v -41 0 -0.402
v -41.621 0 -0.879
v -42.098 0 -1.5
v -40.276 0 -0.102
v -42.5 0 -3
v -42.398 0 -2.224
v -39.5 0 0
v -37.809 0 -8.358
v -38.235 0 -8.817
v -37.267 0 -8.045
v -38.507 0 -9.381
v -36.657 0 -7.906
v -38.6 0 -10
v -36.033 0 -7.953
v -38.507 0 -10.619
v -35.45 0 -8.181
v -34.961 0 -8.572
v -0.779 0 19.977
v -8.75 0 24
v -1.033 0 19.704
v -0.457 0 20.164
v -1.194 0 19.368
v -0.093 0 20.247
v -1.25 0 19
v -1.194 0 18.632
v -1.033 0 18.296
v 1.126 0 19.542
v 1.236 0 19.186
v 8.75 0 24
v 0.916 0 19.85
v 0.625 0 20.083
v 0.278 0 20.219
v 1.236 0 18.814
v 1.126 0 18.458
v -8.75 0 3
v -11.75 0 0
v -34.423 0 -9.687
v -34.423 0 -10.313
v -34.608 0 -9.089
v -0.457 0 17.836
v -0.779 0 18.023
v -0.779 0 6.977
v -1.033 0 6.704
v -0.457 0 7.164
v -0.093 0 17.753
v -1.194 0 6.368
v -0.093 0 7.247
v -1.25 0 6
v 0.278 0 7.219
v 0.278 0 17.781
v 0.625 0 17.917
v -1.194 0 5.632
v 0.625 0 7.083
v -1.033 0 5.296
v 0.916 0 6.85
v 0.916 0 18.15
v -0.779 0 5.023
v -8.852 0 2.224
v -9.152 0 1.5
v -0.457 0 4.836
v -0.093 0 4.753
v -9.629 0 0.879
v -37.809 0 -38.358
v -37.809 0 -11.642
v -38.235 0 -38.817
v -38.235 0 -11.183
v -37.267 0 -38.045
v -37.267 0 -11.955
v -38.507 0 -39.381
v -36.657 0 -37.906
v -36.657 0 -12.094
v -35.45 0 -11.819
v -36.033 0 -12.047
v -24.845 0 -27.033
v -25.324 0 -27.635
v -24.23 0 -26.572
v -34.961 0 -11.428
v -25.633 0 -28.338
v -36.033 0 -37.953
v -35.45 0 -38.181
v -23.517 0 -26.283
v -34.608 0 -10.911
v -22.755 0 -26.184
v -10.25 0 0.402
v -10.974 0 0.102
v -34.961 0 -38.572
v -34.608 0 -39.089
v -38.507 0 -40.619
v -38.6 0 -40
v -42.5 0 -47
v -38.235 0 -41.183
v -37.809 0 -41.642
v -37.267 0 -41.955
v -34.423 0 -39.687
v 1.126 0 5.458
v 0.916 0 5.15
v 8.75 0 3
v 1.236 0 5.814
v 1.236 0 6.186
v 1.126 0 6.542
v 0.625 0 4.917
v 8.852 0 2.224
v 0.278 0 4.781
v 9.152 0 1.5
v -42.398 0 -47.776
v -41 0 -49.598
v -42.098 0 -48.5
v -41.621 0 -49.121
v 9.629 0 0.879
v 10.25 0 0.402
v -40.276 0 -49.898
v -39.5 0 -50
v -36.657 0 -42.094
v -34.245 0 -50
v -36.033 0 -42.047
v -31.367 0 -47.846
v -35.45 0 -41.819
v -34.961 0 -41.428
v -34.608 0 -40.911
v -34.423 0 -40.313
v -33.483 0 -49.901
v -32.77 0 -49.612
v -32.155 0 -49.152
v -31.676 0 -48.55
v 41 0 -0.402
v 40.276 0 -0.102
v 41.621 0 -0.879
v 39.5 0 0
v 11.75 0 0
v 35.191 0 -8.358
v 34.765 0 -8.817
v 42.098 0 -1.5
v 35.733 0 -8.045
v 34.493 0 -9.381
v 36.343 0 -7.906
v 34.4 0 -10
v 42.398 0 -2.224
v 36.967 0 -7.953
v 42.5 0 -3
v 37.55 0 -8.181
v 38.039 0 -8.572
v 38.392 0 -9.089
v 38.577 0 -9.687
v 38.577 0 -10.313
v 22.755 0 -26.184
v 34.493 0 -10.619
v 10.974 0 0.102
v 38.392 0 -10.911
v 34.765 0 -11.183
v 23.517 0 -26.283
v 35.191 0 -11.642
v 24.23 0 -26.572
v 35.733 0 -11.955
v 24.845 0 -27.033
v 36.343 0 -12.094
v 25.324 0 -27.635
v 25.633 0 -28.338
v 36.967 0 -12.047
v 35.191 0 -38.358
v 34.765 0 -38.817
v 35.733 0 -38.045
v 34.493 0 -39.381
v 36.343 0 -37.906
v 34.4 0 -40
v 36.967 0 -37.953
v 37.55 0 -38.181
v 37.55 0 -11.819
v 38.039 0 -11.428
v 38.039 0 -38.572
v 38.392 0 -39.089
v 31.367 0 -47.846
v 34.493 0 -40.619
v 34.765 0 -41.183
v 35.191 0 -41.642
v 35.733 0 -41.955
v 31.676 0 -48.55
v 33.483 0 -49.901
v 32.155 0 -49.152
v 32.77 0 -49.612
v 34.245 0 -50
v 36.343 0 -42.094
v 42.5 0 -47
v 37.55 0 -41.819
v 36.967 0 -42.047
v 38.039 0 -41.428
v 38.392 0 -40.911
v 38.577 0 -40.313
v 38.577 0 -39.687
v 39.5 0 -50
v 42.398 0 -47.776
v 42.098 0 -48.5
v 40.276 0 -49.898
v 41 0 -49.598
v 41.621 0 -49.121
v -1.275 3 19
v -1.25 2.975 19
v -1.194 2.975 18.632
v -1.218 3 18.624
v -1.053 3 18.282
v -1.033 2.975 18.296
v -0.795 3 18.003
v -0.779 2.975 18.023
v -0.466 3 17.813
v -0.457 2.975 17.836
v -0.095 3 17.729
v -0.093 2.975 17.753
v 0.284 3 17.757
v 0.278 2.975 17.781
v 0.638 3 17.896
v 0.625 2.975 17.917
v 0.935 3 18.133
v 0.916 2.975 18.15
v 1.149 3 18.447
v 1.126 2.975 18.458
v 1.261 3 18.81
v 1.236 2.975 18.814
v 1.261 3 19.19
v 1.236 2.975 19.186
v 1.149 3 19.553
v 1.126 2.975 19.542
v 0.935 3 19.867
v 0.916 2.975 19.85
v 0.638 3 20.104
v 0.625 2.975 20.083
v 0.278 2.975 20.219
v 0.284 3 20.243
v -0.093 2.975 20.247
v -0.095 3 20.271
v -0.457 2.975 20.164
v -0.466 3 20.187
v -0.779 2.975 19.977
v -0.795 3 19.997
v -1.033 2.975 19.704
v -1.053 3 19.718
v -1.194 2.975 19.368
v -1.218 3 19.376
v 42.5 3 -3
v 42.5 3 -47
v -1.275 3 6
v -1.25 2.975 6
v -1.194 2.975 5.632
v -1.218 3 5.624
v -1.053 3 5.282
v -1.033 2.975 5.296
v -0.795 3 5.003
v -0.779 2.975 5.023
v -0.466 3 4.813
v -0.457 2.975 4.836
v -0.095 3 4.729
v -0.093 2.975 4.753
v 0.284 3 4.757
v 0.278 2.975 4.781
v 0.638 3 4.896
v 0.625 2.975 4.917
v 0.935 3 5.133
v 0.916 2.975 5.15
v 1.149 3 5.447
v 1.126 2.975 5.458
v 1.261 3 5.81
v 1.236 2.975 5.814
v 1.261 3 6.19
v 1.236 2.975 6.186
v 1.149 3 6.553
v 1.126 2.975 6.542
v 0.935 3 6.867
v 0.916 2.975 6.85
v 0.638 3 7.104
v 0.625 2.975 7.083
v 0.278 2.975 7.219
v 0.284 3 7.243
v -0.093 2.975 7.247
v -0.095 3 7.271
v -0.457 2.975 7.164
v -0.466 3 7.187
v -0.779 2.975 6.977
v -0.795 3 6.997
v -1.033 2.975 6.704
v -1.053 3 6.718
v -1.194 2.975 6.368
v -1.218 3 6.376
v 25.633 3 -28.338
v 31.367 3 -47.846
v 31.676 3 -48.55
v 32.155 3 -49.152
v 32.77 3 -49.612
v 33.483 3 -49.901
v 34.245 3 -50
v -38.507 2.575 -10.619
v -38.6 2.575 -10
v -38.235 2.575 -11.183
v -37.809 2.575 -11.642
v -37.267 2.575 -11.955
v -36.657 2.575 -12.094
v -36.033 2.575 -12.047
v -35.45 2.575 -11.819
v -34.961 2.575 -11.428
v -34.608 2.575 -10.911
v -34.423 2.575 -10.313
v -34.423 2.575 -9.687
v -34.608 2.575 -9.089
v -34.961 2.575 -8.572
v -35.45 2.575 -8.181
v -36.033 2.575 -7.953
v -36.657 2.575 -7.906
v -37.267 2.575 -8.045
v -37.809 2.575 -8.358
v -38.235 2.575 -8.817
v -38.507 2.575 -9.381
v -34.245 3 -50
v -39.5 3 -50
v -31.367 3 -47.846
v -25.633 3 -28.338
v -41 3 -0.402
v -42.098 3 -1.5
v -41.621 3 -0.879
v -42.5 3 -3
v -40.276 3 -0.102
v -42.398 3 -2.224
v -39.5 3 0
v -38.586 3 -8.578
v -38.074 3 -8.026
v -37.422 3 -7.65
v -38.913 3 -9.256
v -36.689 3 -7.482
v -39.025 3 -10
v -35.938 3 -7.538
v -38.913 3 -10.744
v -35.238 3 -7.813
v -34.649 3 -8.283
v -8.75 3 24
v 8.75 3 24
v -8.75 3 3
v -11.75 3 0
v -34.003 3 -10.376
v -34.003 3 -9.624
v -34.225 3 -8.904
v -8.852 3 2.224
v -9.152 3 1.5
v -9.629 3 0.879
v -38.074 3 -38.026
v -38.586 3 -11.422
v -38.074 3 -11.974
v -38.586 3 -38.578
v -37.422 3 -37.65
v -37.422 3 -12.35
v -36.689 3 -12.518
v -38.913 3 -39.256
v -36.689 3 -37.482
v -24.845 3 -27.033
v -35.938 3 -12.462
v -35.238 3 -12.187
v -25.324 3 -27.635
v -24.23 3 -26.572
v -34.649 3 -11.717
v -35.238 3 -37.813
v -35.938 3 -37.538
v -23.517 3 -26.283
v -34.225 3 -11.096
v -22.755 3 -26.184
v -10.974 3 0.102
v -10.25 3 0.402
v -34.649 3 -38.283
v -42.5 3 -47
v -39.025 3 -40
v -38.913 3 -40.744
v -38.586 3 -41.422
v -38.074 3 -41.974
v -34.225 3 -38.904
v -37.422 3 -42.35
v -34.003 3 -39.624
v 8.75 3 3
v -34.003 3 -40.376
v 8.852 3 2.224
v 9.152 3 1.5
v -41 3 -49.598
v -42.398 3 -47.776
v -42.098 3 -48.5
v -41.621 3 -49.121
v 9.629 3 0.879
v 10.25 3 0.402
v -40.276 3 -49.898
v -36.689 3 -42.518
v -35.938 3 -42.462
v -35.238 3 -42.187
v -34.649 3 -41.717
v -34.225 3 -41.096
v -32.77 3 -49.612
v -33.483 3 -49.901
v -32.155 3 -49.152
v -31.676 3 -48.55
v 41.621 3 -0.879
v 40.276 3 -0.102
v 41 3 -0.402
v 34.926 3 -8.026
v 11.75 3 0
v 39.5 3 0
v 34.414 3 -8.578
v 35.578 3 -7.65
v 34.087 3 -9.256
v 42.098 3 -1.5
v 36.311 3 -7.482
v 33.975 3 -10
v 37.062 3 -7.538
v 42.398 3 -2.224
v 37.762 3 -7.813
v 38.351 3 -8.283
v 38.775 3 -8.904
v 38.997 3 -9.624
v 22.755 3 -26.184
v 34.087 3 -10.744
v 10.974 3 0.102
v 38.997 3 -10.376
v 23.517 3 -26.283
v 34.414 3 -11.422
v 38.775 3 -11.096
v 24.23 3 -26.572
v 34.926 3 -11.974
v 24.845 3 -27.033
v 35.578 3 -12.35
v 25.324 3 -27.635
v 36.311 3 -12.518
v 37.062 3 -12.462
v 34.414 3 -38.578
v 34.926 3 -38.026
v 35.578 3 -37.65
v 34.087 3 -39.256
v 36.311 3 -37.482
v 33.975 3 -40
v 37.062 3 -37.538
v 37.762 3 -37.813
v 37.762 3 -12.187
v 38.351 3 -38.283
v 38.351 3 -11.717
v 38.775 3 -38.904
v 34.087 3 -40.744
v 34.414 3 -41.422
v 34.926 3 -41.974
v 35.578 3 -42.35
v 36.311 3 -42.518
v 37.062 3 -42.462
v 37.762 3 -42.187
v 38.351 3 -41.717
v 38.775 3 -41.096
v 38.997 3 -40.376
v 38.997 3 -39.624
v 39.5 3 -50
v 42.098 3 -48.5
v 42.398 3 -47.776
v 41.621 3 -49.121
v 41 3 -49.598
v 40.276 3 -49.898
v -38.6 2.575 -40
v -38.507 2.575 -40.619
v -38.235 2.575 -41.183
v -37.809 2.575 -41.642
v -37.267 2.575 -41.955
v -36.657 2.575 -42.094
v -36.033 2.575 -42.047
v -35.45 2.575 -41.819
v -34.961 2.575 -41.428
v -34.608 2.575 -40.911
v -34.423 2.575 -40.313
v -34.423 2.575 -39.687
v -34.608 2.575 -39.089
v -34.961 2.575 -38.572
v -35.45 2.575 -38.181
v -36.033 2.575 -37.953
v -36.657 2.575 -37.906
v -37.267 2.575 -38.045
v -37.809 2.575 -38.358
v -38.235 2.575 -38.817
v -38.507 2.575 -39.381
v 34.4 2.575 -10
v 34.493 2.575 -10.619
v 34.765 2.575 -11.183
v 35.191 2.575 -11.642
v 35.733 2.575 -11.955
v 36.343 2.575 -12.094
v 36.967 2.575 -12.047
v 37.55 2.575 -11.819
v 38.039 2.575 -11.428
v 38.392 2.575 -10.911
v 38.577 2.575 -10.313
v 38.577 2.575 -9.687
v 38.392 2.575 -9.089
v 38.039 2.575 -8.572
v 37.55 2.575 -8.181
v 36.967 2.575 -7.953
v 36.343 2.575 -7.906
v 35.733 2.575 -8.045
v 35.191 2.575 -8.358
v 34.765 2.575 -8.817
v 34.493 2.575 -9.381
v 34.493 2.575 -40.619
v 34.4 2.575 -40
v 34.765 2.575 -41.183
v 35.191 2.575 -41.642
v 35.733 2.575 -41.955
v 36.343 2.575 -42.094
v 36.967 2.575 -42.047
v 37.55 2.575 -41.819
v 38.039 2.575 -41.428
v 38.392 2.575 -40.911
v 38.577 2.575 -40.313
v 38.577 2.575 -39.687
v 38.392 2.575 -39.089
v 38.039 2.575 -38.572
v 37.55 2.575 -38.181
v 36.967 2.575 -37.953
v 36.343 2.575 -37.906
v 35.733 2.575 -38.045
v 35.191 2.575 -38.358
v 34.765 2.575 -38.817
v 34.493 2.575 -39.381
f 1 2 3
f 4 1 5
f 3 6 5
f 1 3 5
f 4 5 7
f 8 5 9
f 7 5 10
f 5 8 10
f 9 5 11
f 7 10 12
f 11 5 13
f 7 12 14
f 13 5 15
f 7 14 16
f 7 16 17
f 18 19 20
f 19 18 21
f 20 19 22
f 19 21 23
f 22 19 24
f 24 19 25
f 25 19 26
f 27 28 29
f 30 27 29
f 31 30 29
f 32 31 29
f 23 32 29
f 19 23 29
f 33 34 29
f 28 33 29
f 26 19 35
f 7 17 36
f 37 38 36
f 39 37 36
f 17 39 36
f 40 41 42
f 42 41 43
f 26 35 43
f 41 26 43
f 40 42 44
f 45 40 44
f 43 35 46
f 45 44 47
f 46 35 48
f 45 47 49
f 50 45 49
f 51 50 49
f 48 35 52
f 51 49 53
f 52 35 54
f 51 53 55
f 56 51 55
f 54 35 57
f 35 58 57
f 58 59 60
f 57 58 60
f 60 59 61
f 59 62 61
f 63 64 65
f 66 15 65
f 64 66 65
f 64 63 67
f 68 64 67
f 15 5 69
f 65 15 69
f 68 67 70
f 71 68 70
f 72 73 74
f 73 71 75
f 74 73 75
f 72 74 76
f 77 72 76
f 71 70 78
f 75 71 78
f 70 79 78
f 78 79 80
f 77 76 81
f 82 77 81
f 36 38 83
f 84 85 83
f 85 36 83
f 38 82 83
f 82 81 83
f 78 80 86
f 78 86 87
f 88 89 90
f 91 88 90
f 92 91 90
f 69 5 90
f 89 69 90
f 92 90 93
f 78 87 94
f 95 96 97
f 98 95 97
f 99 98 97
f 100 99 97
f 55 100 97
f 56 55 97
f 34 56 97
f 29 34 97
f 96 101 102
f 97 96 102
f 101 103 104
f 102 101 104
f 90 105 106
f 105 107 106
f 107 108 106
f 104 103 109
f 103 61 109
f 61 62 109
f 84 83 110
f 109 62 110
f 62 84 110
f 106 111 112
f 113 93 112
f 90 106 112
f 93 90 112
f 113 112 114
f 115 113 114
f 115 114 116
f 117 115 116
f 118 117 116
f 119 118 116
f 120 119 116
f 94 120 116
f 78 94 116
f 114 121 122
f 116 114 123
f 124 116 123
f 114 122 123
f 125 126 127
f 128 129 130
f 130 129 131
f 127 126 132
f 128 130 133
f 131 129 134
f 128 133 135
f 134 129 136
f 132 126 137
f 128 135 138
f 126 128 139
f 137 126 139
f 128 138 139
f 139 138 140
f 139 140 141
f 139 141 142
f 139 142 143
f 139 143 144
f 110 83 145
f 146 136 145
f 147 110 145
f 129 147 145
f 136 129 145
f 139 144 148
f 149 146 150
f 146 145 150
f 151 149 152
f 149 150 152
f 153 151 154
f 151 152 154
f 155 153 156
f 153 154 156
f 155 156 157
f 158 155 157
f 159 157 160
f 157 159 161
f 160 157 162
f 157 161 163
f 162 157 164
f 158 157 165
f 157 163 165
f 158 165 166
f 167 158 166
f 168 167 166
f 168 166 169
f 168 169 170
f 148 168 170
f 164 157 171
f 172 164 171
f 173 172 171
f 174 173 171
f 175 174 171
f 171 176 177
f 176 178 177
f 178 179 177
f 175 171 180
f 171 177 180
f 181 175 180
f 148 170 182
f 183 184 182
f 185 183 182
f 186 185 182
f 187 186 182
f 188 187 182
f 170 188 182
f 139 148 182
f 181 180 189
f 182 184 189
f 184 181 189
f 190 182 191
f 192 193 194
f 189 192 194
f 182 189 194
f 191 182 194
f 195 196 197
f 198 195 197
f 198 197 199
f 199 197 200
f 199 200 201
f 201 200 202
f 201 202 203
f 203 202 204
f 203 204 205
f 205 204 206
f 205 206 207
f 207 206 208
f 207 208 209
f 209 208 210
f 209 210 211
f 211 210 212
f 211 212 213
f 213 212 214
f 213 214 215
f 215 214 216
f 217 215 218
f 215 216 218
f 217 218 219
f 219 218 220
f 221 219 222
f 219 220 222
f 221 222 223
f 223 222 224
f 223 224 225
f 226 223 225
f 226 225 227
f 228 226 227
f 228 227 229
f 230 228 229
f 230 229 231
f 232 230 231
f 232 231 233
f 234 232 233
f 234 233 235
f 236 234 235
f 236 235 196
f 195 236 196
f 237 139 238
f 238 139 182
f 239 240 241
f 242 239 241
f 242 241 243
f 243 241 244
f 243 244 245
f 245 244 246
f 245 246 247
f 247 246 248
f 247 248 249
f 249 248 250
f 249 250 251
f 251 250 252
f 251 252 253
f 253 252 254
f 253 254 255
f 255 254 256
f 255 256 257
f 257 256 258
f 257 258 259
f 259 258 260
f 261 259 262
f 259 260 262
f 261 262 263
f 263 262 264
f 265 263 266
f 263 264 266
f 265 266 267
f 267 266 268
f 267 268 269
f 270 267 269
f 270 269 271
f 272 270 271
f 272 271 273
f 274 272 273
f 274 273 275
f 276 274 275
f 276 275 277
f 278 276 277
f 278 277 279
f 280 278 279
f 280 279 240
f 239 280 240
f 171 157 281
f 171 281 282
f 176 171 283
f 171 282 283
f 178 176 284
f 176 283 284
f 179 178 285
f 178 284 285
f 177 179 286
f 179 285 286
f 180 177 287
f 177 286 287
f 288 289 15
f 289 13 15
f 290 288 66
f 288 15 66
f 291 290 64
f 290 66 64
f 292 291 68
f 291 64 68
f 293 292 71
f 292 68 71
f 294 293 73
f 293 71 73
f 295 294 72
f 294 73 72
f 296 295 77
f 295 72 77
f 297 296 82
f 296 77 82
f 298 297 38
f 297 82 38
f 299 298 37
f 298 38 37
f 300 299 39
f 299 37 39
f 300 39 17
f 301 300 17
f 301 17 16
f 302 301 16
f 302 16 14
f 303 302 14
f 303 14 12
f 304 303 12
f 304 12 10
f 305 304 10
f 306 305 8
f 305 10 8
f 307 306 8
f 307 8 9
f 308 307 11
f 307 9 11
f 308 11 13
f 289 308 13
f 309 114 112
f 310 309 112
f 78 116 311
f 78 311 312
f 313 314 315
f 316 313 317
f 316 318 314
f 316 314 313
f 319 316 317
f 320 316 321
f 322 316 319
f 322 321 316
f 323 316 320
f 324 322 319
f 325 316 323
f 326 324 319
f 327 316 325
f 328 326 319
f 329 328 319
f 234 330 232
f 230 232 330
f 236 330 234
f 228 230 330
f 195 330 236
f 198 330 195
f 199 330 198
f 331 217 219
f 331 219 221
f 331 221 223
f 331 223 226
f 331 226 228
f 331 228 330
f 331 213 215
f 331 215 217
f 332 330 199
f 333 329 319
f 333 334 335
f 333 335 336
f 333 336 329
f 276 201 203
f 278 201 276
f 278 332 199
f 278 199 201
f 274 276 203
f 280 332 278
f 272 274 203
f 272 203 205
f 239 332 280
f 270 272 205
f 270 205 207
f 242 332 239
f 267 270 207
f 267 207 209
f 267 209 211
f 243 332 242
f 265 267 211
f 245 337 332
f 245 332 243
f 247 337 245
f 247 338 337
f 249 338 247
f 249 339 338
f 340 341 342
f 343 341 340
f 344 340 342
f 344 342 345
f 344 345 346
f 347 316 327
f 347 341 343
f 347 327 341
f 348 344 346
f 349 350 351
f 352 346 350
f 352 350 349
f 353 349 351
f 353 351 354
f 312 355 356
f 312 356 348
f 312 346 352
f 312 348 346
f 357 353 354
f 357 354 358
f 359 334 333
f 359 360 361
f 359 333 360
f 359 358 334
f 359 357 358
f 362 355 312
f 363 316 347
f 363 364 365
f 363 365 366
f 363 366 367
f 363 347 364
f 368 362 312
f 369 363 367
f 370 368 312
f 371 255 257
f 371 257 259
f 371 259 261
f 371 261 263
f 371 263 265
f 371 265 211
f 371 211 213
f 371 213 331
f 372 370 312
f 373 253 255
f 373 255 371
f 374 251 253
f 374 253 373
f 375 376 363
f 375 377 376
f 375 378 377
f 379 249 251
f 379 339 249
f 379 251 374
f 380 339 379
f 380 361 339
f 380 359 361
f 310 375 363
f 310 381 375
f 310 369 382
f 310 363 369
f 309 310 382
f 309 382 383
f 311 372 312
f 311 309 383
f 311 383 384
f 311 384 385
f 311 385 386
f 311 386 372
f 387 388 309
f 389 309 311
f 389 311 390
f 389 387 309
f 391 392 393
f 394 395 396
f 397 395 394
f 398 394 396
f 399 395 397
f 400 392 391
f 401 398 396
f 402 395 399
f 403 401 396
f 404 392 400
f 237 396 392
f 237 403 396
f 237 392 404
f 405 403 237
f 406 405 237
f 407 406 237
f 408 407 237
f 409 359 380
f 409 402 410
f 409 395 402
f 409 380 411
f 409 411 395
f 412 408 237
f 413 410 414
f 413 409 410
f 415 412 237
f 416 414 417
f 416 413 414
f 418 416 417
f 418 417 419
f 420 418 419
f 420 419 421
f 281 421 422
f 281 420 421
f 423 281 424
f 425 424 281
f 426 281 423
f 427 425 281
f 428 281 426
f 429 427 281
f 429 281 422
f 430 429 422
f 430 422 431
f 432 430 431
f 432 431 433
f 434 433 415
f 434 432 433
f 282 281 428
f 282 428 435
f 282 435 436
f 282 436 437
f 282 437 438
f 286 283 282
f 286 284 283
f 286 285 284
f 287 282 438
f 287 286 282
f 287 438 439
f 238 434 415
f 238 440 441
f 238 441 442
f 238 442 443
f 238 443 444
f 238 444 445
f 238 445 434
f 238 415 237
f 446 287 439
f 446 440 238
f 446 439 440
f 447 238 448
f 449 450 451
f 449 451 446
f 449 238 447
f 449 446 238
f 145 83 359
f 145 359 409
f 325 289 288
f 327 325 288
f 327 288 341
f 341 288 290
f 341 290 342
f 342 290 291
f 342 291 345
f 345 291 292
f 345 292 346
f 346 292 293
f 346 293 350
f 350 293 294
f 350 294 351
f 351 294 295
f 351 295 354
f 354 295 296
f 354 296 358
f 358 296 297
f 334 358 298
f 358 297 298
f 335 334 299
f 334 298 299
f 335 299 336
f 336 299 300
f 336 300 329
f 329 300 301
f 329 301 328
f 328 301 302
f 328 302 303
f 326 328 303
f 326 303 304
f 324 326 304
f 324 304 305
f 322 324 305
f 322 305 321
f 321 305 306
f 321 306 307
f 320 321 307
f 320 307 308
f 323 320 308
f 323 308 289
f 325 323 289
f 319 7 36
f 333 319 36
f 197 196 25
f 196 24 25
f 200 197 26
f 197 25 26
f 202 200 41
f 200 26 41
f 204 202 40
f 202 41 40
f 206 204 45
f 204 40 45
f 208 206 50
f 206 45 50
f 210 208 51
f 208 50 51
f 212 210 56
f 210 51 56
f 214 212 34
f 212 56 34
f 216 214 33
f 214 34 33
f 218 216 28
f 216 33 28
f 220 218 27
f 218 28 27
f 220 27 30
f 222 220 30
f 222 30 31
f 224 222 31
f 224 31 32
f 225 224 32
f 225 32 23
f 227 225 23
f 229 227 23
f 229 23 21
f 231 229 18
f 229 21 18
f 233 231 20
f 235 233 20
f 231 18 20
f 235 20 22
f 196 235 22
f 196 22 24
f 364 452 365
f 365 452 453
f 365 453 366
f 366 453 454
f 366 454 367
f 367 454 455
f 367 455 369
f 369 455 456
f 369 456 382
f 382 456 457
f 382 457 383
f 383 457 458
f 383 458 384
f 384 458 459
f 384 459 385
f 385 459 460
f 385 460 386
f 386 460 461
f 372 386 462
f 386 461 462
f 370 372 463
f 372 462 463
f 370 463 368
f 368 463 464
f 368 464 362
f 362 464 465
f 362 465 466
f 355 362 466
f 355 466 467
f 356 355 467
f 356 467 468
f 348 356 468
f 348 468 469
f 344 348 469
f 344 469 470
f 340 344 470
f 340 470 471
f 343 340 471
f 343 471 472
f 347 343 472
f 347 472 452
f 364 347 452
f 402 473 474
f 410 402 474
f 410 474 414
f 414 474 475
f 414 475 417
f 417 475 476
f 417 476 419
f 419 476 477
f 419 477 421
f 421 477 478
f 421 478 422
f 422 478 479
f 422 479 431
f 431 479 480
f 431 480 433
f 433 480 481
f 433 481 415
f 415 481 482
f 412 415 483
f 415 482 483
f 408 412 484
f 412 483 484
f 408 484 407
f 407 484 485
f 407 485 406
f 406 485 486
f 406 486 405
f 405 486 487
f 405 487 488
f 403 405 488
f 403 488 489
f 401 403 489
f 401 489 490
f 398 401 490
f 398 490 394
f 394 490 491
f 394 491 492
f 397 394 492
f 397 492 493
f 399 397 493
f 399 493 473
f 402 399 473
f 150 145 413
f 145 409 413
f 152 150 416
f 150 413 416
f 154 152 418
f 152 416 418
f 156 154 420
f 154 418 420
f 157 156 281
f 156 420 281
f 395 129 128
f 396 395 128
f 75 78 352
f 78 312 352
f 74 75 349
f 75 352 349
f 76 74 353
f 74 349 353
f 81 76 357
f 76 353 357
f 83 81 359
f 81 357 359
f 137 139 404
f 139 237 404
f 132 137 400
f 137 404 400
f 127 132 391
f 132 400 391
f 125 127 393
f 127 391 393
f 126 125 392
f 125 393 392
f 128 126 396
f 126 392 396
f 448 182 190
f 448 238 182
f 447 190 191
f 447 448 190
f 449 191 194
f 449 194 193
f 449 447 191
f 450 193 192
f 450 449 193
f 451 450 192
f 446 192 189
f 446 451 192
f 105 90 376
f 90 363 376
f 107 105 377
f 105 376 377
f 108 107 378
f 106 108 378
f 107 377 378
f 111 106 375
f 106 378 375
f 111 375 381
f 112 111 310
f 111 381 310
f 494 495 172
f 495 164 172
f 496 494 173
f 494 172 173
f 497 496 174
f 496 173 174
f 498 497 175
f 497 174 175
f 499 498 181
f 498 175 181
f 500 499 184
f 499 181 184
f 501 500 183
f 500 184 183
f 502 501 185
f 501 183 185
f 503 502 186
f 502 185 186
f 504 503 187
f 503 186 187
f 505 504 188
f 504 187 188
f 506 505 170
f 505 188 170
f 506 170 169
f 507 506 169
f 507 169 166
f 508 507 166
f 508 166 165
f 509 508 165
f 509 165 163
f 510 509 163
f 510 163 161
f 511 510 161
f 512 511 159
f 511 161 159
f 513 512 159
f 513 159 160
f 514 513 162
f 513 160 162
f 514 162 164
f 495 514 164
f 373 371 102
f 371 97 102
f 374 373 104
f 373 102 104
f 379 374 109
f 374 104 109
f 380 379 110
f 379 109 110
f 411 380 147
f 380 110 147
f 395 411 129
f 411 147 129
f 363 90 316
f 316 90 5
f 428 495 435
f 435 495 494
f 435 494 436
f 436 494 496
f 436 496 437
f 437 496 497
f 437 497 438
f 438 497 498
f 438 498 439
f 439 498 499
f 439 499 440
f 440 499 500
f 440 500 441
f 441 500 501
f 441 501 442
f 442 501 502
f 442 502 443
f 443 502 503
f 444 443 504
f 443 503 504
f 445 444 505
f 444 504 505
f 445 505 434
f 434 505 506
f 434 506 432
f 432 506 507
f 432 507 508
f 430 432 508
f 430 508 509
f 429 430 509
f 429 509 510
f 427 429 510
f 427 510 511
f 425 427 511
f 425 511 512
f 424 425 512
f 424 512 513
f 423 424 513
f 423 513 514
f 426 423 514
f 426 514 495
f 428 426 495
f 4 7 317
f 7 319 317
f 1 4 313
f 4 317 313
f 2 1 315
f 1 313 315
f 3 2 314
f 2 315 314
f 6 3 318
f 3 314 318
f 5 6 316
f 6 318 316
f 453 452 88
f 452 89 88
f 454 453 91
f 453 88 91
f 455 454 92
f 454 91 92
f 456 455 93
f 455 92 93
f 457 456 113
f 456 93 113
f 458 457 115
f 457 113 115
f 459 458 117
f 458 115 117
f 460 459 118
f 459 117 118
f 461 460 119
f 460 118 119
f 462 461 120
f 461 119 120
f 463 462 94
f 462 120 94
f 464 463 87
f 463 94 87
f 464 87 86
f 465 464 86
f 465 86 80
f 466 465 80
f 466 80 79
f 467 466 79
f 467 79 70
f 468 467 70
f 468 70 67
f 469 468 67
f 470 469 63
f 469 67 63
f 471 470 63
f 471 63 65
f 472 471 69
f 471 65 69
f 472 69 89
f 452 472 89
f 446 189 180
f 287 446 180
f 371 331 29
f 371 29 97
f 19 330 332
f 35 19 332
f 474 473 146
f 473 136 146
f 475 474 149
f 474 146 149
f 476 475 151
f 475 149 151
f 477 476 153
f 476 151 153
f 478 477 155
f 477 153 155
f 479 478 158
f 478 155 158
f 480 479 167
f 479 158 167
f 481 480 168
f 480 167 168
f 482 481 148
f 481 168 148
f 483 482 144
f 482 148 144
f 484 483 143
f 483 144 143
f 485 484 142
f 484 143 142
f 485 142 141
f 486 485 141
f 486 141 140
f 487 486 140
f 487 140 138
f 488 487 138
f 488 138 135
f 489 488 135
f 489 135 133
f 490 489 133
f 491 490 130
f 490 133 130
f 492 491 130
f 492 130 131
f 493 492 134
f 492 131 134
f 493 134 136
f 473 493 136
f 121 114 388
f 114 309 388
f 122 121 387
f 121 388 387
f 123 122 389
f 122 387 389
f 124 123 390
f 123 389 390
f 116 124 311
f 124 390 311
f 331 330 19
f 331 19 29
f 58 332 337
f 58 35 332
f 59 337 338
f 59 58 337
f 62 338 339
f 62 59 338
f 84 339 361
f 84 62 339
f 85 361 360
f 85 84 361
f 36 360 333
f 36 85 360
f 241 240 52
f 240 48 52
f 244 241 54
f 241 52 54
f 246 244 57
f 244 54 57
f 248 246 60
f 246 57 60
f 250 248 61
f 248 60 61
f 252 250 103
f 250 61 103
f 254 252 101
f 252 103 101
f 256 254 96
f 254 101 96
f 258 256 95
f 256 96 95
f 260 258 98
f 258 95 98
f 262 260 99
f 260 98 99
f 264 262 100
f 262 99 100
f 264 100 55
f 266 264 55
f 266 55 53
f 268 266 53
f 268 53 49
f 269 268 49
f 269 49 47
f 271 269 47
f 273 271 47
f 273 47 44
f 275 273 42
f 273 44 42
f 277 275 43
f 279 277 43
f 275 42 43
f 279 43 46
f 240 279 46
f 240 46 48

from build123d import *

# Parameters (mm, degrees)
BOSS_EXTRUDE1_DEPTH                  = 3
SKETCH10_W                           = 17.5
SKETCH10_H                           = 24
BOSS_EXTRUDE2_DEPTH                  = 3
F_2_5_2_5_DIAMETER_HOLE1_D           = 2.5
F_2_5_2_5_DIAMETER_HOLE1_DEPTH       = 6.35
F_2_5_2_5_DIAMETER_HOLE1_CSINK_D     = 2.55
F_2_5_2_5_DIAMETER_HOLE1_CSINK_ANGLE = 90
F_2_5_2_5_DIAMETER_HOLE1_TIP         = 0.751075774
M5X0_8_TAPPED_HOLE1_D                = 4.2
M5X0_8_TAPPED_HOLE1_DEPTH            = 12.4
M5X0_8_TAPPED_HOLE1_CSINK_D          = 5.05
M5X0_8_TAPPED_HOLE1_CSINK_ANGLE      = 90
M5X0_8_TAPPED_HOLE1_TIP              = 1.2618073
CUT_EXTRUDE3_DEPTH                   = 4
FILLET1_R                            = 3


with BuildPart() as part:
    # Sketch2 → Boss-Extrude1 (new body)
    with BuildSketch(Plane(origin=(0, 0, 0), x_dir=(1, 0, 0), z_dir=(0, 1, 0))):
        Polygon((42.5, 0), (42.5, 50), (22.5, 50), (8.75, 26.184301396), (-8.75, 26.184301396), (-22.5, 50), (-42.5, 50), (-42.5, 0), align=None)
    extrude(amount=BOSS_EXTRUDE1_DEPTH)

    # Sketch10 → Boss-Extrude2 (add)
    with BuildSketch(Plane(origin=(0, 3, 0), x_dir=(1, 0, 0), z_dir=(0, 1, 0))):
        with Locations((0, -12)):
            Rectangle(SKETCH10_W, SKETCH10_H)
    extrude(amount=-BOSS_EXTRUDE2_DEPTH)

    # Ø2.5 (2.5) Diameter Hole1
    with Locations(Plane(origin=(0, 3, 0), x_dir=(1, 0, 0), z_dir=(0, 1, 0))):
        with Locations((0, -19), (0, -6)):
            CounterSinkHole(F_2_5_2_5_DIAMETER_HOLE1_D / 2, F_2_5_2_5_DIAMETER_HOLE1_CSINK_D / 2, depth=F_2_5_2_5_DIAMETER_HOLE1_DEPTH, counter_sink_angle=F_2_5_2_5_DIAMETER_HOLE1_CSINK_ANGLE)
            with Locations((0, 0, -(F_2_5_2_5_DIAMETER_HOLE1_DEPTH + F_2_5_2_5_DIAMETER_HOLE1_TIP / 2))):  # 118° drill point
                Cone(0, F_2_5_2_5_DIAMETER_HOLE1_D / 2, F_2_5_2_5_DIAMETER_HOLE1_TIP, mode=Mode.SUBTRACT)

    # M5x0.8 Tapped Hole1
    with Locations(Plane(origin=(0, 3, 0), x_dir=(1, 0, 0), z_dir=(0, 1, 0))):
        with Locations((-36.5, 40), (36.5, 40), (-36.5, 10), (36.5, 10)):
            CounterSinkHole(M5X0_8_TAPPED_HOLE1_D / 2, M5X0_8_TAPPED_HOLE1_CSINK_D / 2, depth=M5X0_8_TAPPED_HOLE1_DEPTH, counter_sink_angle=M5X0_8_TAPPED_HOLE1_CSINK_ANGLE)
            with Locations((0, 0, -(M5X0_8_TAPPED_HOLE1_DEPTH + M5X0_8_TAPPED_HOLE1_TIP / 2))):  # 118° drill point
                Cone(0, M5X0_8_TAPPED_HOLE1_D / 2, M5X0_8_TAPPED_HOLE1_TIP, mode=Mode.SUBTRACT)

    # Sketch9 → Cut-Extrude3 (cut, through all)
    with BuildSketch(Plane.XZ):
        Polygon((-32, -50), (-25, -26.184301396), (25, -26.184301396), (32, -50), align=None)
    extrude(amount=-CUT_EXTRUDE3_DEPTH, mode=Mode.SUBTRACT)

    # Fillet1
    fillet1_edges = [part.edges().sort_by_distance(p)[0] for p in [
        (25, 1.5, -26.184301396),
        (-42.5, 1.5, 0),
        (-42.5, 1.5, -50),
        (42.5, 1.5, -50),
        (42.5, 1.5, 0),
        (-8.75, 1.5, 0),
        (8.75, 1.5, 0),
        (32, 1.5, -50),
        (-25, 1.5, -26.184301396),
        (-32, 1.5, -50),
    ]]
    fillet(fillet1_edges, radius=FILLET1_R)


solid = part.part
